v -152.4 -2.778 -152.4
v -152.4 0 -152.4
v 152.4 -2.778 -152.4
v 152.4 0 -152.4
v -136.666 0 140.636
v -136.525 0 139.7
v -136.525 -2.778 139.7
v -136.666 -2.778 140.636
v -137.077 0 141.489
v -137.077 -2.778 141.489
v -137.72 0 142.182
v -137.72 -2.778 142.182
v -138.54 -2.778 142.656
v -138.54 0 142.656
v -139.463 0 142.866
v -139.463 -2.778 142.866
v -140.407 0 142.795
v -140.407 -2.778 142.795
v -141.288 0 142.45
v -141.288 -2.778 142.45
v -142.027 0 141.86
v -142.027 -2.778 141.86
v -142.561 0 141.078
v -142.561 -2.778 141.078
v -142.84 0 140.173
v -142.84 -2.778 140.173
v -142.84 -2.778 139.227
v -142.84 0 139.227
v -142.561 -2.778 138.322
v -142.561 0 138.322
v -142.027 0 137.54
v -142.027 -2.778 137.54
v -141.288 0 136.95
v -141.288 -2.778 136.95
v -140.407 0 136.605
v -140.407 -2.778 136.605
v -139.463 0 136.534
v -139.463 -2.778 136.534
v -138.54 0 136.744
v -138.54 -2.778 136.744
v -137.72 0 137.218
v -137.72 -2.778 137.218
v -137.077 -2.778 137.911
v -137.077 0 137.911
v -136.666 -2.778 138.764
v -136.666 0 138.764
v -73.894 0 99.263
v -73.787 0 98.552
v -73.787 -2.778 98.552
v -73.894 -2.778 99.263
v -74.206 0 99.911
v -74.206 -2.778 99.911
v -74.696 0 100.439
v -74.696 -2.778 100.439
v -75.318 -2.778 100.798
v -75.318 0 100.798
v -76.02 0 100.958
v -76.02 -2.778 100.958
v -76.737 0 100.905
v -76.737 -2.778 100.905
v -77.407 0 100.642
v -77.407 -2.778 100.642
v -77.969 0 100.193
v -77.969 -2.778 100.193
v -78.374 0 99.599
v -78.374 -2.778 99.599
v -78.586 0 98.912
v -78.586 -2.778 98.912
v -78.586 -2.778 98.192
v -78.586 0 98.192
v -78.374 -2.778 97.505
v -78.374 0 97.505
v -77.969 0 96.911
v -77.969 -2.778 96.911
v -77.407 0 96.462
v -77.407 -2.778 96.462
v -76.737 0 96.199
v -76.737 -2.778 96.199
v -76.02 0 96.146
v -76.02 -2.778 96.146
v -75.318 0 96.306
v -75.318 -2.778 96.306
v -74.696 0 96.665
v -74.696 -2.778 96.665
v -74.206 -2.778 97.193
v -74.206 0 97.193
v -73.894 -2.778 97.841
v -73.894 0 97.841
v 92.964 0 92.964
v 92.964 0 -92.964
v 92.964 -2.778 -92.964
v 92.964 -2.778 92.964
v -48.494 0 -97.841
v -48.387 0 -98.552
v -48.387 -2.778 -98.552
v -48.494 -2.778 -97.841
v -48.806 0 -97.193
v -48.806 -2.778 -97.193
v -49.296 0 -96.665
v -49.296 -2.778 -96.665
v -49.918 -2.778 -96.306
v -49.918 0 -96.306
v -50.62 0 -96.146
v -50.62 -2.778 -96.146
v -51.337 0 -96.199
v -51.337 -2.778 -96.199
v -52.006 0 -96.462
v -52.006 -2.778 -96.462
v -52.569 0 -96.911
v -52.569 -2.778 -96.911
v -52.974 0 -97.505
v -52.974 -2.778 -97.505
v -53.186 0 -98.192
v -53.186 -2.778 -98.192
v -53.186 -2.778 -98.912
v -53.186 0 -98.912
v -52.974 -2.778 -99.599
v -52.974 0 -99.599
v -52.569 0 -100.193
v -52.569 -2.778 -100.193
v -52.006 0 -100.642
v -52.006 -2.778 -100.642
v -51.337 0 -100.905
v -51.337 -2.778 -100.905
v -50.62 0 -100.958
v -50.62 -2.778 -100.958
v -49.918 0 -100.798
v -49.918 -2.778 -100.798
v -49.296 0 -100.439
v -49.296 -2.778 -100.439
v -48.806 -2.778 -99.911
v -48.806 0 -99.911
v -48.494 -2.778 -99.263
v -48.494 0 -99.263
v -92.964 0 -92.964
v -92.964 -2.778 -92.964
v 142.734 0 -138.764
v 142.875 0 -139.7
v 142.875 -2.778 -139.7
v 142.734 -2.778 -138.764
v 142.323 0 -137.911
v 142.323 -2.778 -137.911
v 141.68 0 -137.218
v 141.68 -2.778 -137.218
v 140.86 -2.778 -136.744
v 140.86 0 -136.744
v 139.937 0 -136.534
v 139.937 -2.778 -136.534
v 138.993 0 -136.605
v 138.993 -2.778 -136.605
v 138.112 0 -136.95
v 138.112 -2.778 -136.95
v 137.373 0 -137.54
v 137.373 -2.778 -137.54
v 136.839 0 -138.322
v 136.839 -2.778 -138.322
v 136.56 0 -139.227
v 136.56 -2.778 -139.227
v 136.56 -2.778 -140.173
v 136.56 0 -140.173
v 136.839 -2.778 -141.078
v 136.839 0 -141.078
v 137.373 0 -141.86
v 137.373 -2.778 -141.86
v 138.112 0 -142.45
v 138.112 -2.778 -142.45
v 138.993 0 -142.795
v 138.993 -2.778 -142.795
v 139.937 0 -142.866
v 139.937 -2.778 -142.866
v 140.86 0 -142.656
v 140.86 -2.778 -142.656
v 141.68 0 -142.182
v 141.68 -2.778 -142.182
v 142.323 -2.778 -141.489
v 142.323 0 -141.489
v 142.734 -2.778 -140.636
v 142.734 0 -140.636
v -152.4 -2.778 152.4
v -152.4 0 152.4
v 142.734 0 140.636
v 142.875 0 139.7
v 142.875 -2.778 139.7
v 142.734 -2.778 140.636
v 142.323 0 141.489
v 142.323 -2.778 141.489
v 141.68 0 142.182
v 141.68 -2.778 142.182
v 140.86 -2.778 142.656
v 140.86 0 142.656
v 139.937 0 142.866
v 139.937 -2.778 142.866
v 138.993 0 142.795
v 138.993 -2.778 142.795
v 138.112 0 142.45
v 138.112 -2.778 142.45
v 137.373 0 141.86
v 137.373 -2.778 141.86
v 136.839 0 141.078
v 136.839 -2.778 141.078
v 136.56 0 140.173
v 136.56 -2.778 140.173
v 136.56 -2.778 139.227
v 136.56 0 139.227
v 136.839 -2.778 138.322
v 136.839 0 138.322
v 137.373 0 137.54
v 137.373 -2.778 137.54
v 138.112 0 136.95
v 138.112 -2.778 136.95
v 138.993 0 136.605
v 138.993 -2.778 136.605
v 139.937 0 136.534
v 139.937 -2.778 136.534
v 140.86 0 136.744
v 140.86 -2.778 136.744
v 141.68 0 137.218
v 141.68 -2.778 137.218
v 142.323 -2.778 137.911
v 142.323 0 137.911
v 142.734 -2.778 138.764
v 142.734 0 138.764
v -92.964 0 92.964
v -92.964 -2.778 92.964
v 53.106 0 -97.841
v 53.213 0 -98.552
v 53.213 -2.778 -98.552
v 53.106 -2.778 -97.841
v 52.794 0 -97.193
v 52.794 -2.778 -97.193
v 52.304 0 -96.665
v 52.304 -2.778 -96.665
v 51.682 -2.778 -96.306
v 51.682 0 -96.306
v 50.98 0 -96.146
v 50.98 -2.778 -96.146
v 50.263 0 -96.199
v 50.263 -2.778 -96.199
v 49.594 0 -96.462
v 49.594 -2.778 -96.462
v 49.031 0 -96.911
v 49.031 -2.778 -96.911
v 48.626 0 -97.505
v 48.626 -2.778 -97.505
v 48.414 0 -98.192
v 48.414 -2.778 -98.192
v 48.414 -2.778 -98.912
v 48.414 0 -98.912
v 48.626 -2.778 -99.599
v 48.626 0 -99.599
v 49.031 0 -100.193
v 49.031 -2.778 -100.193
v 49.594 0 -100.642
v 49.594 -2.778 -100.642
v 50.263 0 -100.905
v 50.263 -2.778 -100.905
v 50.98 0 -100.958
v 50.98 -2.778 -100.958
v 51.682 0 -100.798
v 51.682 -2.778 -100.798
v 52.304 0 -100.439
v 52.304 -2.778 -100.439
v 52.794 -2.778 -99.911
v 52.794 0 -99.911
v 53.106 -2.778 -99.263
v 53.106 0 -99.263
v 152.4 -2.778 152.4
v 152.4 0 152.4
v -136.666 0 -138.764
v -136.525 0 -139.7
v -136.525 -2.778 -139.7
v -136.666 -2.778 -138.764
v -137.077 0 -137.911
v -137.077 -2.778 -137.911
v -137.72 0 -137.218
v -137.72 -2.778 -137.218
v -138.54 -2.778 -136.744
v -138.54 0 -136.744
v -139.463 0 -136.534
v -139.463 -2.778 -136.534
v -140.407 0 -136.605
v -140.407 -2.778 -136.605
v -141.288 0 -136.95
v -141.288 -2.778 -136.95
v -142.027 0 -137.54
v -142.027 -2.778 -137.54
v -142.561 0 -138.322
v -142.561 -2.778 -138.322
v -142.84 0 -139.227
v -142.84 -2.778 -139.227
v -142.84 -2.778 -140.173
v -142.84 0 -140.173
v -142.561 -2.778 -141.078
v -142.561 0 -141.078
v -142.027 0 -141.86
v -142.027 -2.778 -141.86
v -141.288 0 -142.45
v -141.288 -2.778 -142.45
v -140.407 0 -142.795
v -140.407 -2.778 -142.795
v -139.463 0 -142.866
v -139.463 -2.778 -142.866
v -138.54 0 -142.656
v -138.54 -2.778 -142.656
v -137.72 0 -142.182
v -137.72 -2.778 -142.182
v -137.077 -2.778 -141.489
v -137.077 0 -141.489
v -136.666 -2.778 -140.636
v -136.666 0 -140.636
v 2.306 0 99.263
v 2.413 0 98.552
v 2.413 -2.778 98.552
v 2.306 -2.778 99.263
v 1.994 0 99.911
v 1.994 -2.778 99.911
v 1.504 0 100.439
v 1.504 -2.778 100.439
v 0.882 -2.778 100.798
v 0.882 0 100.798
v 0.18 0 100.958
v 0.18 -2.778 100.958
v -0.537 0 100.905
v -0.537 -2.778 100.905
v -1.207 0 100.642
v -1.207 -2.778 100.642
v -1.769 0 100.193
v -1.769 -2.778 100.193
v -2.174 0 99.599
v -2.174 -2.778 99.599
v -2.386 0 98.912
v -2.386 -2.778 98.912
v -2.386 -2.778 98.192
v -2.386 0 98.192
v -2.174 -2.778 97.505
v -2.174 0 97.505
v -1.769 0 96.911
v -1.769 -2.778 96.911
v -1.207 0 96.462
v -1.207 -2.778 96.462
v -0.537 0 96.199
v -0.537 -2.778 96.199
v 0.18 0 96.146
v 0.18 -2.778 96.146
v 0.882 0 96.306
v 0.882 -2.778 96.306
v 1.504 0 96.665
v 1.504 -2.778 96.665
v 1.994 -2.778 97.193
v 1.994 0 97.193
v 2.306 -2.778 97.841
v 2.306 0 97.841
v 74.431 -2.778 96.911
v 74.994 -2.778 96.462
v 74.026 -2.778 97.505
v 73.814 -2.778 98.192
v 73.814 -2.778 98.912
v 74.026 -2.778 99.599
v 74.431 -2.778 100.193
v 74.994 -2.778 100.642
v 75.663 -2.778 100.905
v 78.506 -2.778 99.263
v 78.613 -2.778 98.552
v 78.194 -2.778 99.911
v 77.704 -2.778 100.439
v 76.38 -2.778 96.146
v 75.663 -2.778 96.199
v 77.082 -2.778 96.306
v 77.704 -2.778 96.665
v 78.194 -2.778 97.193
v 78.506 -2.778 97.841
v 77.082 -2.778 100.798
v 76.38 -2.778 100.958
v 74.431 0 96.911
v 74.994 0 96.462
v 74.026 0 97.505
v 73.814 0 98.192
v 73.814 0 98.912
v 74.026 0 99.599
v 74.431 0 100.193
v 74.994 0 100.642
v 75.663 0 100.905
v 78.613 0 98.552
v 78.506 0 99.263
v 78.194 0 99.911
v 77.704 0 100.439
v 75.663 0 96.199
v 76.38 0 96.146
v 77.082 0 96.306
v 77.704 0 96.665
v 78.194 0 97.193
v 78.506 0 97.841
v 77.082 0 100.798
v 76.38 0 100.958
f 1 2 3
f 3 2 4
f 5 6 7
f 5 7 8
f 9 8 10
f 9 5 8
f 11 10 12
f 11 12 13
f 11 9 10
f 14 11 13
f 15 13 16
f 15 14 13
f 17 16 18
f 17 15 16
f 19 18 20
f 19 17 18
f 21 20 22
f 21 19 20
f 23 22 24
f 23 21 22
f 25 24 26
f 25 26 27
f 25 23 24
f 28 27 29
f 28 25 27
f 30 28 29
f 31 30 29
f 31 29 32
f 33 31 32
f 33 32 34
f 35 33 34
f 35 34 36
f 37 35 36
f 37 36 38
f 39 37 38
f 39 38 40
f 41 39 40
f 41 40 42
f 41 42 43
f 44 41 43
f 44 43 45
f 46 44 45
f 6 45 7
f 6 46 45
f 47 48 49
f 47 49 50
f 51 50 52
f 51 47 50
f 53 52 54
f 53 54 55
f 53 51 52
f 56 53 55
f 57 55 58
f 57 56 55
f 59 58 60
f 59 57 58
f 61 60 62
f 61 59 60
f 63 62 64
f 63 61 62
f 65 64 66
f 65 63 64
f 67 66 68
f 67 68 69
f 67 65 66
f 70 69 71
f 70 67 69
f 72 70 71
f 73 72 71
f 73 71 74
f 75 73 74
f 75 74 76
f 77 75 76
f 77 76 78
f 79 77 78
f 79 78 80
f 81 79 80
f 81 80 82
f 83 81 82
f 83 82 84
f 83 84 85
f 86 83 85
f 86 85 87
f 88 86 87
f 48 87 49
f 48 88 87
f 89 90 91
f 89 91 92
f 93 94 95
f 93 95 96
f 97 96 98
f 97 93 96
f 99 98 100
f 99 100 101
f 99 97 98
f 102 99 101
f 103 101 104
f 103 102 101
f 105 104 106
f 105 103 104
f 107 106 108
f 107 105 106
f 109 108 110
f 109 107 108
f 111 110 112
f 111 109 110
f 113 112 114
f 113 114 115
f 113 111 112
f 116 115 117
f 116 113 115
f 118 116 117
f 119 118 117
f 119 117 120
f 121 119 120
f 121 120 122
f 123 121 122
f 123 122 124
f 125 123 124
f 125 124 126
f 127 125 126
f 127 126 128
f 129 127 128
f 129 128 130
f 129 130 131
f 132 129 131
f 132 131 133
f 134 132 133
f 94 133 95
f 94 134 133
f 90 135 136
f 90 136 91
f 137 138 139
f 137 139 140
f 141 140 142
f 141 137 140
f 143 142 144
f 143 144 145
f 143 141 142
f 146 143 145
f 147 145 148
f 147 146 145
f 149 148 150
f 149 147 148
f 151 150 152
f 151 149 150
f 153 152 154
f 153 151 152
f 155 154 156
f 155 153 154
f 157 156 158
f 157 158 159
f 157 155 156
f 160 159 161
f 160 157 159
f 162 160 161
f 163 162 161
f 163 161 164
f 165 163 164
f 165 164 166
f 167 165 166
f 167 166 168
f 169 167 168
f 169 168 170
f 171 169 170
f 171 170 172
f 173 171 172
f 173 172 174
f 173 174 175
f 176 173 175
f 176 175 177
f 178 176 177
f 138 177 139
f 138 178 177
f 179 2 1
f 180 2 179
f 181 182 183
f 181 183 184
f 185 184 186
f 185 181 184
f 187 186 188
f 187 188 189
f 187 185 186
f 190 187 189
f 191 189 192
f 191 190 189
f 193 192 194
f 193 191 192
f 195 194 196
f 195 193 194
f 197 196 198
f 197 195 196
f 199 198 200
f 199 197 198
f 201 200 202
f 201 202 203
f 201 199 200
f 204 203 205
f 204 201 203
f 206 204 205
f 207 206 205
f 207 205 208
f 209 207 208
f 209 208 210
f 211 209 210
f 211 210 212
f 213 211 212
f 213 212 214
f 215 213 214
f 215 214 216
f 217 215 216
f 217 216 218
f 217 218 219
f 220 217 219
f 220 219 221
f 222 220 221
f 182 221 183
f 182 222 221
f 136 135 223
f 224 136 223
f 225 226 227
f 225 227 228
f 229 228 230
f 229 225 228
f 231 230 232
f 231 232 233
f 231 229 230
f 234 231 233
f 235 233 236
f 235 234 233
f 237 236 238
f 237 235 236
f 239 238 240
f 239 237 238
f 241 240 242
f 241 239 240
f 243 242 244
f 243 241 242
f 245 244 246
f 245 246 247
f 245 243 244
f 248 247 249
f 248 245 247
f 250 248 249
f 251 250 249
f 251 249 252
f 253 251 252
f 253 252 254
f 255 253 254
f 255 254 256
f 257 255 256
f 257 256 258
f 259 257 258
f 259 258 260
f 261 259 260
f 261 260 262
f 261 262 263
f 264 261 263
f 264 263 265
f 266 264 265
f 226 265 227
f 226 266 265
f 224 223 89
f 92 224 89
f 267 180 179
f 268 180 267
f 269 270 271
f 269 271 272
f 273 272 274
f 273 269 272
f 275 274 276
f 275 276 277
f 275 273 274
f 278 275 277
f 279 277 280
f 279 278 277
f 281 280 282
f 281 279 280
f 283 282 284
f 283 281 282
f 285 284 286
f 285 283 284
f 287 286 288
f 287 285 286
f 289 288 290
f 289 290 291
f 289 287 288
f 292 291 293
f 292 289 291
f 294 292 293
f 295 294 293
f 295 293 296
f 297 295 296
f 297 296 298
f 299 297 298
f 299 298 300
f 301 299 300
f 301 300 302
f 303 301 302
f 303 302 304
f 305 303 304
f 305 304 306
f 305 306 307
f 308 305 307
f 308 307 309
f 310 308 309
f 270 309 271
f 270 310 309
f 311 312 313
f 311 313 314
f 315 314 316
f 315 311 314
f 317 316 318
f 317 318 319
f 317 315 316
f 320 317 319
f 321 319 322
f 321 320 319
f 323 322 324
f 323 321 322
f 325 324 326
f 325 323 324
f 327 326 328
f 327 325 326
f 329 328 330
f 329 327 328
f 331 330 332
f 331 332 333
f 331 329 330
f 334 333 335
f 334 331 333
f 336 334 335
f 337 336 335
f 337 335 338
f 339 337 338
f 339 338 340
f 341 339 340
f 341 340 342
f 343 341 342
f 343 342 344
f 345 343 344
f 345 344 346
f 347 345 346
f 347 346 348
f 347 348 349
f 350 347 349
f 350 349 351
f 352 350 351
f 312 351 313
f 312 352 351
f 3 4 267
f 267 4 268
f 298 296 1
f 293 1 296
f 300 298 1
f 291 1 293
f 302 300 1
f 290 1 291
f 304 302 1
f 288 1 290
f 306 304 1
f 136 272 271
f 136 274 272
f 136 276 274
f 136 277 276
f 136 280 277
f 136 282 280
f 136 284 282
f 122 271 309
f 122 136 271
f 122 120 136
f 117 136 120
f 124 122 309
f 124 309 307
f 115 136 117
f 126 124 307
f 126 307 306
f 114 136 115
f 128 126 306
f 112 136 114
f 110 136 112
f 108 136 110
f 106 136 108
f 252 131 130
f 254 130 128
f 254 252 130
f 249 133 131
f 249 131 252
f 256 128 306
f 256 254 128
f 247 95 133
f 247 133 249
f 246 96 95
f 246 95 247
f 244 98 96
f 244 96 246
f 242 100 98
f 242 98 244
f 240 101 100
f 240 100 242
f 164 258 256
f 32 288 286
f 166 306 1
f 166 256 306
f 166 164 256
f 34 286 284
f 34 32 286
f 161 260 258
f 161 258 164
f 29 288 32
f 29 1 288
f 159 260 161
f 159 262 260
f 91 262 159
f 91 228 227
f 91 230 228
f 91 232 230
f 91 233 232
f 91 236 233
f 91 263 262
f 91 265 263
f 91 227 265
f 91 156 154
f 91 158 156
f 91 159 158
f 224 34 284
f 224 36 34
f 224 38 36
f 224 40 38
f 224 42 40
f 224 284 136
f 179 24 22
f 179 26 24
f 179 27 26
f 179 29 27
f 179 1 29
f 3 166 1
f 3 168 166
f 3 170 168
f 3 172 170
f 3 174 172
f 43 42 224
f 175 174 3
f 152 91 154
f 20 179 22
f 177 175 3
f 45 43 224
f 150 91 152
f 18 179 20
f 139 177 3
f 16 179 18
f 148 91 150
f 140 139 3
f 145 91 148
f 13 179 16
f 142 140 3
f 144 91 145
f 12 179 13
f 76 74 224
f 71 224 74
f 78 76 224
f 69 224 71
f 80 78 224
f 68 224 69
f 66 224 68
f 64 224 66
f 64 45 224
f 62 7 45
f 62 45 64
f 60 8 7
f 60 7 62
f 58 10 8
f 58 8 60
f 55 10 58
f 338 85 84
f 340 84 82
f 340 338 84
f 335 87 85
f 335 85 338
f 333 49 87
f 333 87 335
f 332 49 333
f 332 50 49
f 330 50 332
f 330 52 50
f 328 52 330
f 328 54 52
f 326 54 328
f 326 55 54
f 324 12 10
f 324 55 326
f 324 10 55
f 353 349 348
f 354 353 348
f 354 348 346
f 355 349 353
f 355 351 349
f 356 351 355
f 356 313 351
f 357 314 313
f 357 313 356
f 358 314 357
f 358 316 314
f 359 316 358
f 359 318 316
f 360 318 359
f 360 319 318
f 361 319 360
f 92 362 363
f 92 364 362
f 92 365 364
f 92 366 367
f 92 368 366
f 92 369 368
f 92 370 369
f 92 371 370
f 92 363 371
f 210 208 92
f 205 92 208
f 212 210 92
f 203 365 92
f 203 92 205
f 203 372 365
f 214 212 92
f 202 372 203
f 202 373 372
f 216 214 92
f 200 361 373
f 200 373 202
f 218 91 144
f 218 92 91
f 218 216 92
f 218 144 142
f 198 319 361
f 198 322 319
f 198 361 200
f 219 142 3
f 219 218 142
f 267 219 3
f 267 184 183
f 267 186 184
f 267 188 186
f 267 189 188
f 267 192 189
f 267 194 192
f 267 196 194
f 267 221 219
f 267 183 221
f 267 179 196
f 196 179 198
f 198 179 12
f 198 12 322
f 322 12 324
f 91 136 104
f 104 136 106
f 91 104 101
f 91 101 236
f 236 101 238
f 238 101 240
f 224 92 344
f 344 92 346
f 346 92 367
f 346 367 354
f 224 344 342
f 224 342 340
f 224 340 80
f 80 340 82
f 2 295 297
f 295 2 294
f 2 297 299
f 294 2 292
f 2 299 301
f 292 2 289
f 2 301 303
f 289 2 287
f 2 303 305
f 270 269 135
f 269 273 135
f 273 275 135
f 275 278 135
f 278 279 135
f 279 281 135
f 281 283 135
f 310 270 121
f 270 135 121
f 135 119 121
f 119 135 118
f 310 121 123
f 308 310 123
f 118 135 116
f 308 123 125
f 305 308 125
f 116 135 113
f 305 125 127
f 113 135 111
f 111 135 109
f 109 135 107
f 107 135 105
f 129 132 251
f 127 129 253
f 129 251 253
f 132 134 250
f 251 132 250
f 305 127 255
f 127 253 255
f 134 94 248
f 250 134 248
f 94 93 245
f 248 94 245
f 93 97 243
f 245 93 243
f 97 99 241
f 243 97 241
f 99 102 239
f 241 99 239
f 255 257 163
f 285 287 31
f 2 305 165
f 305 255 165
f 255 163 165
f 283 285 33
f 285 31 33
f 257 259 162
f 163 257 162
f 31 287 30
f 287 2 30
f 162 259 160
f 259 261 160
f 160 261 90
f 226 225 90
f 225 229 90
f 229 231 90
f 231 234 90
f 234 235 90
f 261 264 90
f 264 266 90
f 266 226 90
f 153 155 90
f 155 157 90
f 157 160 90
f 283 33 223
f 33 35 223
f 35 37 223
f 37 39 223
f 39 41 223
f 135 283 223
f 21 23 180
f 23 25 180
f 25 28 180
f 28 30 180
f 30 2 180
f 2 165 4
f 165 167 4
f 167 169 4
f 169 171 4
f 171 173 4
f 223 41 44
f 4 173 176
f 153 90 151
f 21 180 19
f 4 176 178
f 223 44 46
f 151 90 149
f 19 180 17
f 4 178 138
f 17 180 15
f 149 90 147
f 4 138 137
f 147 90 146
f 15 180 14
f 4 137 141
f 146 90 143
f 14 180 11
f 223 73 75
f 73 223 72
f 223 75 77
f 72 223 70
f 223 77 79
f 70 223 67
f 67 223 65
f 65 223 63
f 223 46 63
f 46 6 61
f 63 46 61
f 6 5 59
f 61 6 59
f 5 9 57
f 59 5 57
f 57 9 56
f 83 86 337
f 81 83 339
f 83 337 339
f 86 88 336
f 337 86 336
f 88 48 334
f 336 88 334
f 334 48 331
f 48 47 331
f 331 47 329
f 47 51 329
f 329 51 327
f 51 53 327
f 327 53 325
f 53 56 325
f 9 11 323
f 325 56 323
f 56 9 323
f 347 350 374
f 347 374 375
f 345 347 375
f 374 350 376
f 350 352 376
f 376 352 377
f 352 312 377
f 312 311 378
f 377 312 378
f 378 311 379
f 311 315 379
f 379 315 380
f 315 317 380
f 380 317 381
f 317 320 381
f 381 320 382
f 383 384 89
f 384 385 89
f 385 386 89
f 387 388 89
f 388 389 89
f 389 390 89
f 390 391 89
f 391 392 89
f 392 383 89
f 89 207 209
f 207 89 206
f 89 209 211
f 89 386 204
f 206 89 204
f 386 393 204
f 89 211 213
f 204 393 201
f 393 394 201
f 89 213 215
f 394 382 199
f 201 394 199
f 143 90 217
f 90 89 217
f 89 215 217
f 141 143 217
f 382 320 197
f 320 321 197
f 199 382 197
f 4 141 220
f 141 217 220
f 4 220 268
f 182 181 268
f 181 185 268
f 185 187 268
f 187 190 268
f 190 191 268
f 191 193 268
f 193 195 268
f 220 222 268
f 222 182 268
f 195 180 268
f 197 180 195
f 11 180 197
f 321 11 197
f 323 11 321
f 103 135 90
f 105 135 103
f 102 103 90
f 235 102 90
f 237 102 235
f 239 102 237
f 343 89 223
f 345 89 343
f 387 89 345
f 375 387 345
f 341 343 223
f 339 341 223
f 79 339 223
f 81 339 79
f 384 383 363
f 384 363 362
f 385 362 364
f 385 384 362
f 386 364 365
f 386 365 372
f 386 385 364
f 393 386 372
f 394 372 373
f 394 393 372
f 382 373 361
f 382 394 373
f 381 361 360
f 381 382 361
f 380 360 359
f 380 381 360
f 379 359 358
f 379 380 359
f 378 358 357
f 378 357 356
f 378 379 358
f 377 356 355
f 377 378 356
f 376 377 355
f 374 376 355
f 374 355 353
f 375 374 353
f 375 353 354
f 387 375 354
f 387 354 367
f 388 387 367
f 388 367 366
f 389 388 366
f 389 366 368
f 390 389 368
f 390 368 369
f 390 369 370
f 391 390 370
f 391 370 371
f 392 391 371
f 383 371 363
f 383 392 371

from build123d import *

# Parameters (mm, degrees)
F0_W     = 304.8
F0_H     = 304.8
F0_R     = 3.175
F0_R_2   = 2.413
F0_W_2   = 185.928
F0_H_2   = 185.928
F1_DEPTH = 2.778125


with BuildPart() as f1:
    # F0 (on Front) → F1 (new body)
    with BuildSketch(Plane.XZ):
        Rectangle(F0_W, F0_H)
        with Locations((-139.7, -139.7)):
            Circle(F0_R, mode=Mode.SUBTRACT)
        with Locations((-50.8, -98.552)):
            Circle(F0_R_2, mode=Mode.SUBTRACT)
        with Locations((50.8, -98.552)):
            Circle(F0_R_2, mode=Mode.SUBTRACT)
        with Locations((139.7, -139.7)):
            Circle(F0_R, mode=Mode.SUBTRACT)
        with Locations((-139.7, 139.7)):
            Circle(F0_R, mode=Mode.SUBTRACT)
        with Locations((-76.2, 98.552)):
            Circle(F0_R_2, mode=Mode.SUBTRACT)
        Rectangle(F0_W_2, F0_H_2, mode=Mode.SUBTRACT)
        with Locations((0, 98.552)):
            Circle(F0_R_2, mode=Mode.SUBTRACT)
        with Locations((76.2, 98.552)):
            Circle(F0_R_2, mode=Mode.SUBTRACT)
        with Locations((139.7, 139.7)):
            Circle(F0_R, mode=Mode.SUBTRACT)
    extrude(amount=F1_DEPTH)


solid = f1.part
